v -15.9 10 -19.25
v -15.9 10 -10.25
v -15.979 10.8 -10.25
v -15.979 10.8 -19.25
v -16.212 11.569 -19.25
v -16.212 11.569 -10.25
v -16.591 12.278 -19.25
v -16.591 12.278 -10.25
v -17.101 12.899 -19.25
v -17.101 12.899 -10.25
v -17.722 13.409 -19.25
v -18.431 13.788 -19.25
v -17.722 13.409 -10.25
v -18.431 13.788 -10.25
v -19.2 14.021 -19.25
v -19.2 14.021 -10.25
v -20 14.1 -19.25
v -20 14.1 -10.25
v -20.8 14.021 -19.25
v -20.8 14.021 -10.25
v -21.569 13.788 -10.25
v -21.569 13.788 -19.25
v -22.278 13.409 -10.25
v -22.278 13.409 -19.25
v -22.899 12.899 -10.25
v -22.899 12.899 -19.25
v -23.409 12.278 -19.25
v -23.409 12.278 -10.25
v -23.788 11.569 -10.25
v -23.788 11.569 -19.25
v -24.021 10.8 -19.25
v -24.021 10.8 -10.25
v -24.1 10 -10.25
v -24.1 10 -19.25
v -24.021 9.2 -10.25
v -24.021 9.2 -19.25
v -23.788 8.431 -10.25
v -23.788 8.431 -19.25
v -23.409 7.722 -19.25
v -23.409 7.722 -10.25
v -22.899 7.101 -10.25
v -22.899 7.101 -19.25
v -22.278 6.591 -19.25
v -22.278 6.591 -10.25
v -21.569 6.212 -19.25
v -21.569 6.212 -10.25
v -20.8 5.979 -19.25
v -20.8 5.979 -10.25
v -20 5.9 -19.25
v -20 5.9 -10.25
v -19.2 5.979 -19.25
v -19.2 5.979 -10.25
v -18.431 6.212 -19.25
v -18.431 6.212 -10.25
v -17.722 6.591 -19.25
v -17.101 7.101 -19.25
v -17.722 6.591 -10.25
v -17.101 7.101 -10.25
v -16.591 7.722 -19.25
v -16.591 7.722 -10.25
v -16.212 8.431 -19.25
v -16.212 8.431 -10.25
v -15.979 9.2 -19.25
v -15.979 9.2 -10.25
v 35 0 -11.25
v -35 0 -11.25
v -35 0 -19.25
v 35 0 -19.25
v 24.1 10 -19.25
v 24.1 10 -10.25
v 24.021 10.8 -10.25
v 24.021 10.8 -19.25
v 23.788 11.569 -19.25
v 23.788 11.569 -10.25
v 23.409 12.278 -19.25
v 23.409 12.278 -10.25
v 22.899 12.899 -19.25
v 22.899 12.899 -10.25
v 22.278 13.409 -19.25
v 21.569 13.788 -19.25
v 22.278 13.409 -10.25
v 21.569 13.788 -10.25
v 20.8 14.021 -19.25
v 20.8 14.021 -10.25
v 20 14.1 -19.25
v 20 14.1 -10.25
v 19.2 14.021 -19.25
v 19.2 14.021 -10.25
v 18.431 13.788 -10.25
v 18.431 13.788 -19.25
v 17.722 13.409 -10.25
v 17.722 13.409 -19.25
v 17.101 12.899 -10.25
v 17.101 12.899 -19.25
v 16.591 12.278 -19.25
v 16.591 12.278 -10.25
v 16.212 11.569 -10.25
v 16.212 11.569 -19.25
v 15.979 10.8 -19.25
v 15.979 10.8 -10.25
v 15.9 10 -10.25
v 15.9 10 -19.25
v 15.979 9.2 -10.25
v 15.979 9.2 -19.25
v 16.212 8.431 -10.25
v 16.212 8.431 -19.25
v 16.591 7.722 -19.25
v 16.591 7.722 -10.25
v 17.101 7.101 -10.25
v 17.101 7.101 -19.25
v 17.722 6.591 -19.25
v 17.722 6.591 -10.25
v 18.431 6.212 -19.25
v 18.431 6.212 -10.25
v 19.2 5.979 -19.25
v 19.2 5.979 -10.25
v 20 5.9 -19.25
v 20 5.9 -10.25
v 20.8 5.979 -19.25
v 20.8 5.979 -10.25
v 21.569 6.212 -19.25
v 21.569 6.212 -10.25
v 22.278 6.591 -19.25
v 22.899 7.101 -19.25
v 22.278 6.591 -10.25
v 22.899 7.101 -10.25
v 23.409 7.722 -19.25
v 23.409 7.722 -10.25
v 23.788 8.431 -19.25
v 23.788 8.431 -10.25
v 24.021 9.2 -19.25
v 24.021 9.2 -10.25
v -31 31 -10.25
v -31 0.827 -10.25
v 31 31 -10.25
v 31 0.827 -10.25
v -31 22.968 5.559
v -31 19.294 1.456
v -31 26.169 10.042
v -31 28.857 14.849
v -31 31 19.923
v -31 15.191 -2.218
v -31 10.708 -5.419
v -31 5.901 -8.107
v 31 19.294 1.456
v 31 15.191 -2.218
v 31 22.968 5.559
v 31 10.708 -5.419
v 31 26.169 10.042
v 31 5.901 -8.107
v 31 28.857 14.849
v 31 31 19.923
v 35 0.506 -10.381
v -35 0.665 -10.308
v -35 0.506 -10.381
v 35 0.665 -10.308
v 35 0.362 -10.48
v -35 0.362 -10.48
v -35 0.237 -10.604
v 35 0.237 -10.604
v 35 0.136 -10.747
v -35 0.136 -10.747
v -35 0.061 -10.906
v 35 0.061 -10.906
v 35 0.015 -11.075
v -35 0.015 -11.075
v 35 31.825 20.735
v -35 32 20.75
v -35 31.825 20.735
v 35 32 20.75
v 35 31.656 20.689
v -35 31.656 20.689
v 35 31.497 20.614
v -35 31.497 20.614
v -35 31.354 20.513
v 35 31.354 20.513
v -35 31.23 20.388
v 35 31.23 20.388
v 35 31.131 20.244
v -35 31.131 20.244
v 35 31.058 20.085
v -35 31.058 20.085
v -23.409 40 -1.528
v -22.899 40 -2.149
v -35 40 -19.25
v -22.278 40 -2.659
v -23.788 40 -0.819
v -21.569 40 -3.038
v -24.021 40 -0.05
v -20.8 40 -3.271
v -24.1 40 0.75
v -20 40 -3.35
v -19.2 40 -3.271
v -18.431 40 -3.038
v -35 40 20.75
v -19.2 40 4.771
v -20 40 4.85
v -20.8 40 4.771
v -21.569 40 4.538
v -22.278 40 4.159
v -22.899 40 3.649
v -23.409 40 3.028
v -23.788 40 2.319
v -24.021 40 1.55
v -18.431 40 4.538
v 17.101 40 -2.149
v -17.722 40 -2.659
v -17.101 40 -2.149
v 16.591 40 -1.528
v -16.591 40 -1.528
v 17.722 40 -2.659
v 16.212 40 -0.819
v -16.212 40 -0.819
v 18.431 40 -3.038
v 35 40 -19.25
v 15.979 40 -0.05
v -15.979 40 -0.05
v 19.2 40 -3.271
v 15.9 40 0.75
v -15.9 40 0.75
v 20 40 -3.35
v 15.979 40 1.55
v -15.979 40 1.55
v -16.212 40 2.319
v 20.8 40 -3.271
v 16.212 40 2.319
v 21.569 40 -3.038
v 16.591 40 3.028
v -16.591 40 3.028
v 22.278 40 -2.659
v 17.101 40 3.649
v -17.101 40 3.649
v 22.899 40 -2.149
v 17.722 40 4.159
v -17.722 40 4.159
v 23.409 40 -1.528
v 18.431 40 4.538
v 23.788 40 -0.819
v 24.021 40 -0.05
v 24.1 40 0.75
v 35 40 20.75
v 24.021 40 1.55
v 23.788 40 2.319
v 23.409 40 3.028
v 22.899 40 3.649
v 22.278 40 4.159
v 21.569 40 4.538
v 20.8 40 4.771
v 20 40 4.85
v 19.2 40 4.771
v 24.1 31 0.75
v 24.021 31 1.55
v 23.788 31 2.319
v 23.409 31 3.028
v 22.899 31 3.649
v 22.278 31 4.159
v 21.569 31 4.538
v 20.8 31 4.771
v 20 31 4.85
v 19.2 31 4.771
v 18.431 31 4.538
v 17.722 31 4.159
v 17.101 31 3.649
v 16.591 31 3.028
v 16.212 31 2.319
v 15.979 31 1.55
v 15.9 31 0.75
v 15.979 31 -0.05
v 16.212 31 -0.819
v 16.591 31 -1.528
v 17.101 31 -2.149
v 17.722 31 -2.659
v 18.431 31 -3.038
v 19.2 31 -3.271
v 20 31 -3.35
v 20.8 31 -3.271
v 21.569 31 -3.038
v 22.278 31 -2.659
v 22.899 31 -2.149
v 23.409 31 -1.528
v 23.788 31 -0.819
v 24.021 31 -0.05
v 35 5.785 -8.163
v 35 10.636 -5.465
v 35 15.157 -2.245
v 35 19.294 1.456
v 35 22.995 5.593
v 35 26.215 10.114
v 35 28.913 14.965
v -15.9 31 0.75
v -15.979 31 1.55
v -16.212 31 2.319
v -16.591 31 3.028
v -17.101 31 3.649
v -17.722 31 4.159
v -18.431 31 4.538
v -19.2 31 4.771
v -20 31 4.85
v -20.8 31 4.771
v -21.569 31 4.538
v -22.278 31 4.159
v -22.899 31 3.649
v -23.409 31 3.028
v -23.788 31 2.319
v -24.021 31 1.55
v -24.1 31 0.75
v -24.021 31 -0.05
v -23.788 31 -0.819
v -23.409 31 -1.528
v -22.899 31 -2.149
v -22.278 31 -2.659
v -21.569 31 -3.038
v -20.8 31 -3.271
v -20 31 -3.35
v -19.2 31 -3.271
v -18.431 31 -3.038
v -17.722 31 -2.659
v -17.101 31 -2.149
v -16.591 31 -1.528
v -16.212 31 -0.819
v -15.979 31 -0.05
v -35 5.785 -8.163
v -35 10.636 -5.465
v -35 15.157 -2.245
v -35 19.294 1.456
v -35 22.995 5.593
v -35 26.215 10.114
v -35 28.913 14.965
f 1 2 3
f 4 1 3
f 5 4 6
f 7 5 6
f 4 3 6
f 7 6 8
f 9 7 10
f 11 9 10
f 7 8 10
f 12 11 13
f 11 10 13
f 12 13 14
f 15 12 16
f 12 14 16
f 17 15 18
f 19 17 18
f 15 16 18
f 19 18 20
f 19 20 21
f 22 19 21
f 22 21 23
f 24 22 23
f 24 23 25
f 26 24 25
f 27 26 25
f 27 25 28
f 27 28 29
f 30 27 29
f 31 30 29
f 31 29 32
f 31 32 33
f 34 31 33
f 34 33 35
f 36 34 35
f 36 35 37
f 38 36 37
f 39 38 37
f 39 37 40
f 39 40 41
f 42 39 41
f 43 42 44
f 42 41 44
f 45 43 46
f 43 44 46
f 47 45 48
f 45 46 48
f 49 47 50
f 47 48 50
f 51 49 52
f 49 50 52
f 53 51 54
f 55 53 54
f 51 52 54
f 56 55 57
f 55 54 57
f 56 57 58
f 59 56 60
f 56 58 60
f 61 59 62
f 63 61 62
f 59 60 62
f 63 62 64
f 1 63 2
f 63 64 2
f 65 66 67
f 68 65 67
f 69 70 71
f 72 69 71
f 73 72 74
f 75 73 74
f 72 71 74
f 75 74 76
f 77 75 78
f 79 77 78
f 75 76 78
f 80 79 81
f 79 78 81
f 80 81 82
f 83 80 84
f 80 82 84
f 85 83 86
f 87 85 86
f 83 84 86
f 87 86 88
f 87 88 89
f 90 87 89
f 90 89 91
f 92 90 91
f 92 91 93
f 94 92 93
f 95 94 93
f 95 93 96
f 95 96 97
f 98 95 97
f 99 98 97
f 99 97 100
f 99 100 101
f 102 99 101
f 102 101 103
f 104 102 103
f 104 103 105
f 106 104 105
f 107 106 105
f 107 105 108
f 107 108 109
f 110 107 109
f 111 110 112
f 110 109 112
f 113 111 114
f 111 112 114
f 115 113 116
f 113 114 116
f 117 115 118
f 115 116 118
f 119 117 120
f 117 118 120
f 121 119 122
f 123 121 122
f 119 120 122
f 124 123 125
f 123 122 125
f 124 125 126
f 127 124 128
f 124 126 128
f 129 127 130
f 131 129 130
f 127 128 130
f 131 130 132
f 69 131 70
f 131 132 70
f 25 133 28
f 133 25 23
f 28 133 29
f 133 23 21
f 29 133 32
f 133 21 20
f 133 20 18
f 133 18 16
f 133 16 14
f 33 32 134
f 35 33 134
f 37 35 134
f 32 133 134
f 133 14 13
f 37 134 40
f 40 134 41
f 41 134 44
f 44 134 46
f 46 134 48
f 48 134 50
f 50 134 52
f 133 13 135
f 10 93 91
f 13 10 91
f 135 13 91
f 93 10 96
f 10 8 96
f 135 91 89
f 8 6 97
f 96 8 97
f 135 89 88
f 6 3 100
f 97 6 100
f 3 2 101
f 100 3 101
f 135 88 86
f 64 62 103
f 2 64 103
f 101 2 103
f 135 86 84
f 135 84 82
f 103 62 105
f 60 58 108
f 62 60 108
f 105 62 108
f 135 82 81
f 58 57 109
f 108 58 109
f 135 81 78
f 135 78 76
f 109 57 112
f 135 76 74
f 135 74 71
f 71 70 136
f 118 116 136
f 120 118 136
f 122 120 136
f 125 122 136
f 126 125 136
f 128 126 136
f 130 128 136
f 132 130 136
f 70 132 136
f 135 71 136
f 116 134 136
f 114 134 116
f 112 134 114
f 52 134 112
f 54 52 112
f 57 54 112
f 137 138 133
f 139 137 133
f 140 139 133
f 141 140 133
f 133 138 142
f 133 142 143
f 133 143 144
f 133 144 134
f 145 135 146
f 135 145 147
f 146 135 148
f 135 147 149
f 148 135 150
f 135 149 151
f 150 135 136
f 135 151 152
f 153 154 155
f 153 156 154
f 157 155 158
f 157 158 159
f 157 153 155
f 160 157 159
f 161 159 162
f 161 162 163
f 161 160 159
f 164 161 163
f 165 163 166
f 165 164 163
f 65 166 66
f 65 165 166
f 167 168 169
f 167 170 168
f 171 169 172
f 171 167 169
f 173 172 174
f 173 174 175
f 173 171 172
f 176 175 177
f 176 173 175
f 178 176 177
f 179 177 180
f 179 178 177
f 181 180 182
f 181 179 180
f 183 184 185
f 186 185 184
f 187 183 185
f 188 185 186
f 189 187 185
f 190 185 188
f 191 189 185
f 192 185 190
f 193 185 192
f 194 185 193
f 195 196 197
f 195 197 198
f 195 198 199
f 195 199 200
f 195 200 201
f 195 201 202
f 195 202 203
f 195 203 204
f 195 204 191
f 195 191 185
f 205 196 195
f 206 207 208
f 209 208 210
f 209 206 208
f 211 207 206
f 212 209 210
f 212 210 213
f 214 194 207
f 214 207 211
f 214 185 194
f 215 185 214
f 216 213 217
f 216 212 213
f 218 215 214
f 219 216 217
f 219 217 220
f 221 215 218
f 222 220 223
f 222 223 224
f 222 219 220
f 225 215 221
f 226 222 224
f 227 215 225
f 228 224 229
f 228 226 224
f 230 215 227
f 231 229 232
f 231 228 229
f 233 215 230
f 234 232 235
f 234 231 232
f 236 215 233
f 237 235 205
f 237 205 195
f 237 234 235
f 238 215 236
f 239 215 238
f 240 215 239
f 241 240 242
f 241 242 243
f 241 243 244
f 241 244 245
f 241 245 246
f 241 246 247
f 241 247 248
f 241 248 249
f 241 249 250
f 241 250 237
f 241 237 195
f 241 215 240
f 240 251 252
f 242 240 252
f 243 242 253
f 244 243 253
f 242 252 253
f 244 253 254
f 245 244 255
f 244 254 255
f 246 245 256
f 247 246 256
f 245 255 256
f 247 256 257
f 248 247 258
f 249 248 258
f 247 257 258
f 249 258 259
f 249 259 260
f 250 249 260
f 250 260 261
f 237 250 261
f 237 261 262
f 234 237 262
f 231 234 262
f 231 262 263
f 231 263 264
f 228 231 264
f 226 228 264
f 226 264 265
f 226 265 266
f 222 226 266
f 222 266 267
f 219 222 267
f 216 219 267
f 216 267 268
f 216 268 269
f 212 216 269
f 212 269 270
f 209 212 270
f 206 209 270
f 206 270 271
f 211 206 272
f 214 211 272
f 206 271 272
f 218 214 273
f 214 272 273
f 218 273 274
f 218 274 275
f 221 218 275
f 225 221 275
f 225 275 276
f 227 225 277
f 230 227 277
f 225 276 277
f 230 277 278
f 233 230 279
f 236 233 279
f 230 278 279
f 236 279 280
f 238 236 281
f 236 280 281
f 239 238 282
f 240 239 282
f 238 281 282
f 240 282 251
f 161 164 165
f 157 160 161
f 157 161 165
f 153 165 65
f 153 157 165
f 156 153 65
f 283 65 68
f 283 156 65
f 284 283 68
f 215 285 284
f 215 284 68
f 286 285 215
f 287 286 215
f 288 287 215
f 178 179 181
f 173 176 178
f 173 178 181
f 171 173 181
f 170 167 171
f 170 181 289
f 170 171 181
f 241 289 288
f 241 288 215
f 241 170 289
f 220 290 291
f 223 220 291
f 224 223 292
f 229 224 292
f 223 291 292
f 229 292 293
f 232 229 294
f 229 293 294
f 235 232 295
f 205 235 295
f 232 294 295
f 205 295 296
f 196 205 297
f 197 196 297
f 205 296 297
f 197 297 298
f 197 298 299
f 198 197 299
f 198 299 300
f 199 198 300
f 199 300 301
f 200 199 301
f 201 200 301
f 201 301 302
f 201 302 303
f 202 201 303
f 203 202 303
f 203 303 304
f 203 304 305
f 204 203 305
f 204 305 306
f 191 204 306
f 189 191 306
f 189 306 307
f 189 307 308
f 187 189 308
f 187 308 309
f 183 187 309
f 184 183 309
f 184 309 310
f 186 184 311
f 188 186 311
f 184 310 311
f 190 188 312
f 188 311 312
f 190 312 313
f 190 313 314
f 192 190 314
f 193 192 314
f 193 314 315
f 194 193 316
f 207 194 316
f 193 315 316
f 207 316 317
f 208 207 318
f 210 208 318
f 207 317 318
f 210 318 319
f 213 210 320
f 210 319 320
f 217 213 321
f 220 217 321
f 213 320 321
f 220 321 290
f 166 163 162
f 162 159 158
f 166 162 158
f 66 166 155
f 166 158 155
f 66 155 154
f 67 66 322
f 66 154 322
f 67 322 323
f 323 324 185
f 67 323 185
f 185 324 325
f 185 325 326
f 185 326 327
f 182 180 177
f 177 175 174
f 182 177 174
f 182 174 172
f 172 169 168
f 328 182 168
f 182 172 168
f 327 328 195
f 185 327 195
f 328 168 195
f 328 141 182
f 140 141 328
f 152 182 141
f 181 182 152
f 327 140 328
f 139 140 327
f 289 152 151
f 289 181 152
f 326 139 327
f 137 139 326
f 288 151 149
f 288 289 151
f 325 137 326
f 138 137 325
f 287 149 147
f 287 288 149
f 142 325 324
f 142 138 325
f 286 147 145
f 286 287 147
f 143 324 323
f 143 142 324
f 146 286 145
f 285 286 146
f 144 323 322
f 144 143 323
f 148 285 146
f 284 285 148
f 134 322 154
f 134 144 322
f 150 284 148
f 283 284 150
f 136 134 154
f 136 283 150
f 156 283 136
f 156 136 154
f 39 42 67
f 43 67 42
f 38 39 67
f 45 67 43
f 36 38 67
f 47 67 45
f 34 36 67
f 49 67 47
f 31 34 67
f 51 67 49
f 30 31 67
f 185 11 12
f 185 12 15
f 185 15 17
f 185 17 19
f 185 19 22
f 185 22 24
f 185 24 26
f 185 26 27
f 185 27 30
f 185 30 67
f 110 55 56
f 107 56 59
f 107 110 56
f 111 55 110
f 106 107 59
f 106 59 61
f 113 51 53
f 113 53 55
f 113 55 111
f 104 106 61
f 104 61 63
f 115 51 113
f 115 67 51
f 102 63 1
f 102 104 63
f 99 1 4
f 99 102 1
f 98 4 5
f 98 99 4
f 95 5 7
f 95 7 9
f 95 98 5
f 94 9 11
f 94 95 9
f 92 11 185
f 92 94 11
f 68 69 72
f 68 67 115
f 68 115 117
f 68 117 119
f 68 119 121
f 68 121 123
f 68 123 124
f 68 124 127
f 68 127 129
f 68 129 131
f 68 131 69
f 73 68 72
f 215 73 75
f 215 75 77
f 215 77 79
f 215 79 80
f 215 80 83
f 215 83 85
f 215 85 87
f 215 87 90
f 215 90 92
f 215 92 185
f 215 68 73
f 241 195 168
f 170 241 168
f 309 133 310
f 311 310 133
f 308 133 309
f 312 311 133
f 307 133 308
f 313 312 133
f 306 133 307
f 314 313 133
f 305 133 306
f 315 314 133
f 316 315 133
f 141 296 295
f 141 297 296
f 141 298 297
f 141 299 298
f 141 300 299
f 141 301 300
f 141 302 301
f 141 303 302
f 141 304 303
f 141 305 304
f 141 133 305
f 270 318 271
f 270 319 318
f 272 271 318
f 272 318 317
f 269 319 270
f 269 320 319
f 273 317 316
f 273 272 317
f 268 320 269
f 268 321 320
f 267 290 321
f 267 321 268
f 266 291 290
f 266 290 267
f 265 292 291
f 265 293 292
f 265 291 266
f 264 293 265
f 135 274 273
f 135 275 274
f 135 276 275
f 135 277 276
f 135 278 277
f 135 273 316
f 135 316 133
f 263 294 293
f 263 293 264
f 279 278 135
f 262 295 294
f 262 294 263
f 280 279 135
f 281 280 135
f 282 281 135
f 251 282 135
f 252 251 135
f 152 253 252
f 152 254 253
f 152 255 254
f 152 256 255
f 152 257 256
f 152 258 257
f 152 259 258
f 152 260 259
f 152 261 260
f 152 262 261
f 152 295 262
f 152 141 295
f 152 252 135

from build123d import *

# Parameters (mm, degrees)
F1_DEPTH = 35
F2_R     = 4.1
F3_DEPTH = 31
F4_DEPTH = 40.001
F5_R     = 4.1
F6_DEPTH = 19.2509998957


# Not quite as in the source:
# - ends of sketch curves that miss each other by under 0.0002 mm in the source are joined


with BuildPart() as f1:
    # F0 (on Right) → F1 (new body, symmetric)
    with BuildSketch(Plane.YZ):
        with BuildLine():
            ThreePointArc((0.6654529791, -10.3075948367), (0.1831243905, -10.6731600274), (3e-10, -11.2499998957))
            Line((3e-10, -11.2499998957), (0, -19.2499998957))
            Line((0, -19.2499998957), (40, -19.2499998957))
            Line((40, -19.2499998957), (40, 20.7500001043))
            Line((40, 20.7500001043), (32, 20.7500001043))
            ThreePointArc((32, 20.7500001043), (31.4231601317, 20.5668757138), (31.057594941, 20.0845471252))
            ThreePointArc((31.057594941, 20.0845471252), (19.2938390593, 1.456161045), (0.6654529791, -10.3075948367))
        make_face()
    extrude(amount=F1_DEPTH, both=True)

    # F2 (on Front) → F3 (cut)
    with BuildSketch(Plane.XZ):
        Polygon((-15.9000523031, -10.2499328405), (15.8999476969, -10.2499328405), (19.9999476969, -10.2499328405), (24.0999476969, -10.2499328405), (30.9999476969, -10.2499328405), (30.9999476969, 19.9232501595), (-31.0000523031, 19.9232501595), (-31.0000523031, -10.2499328405), (-24.1000523031, -10.2499328405), (-20.0000523031, -10.2499328405), align=None)
        with Locations((-20.0000523031, 0.7500671595)):
            Circle(F2_R, mode=Mode.SUBTRACT)
        with Locations((19.9999476969, 0.7500671595)):
            Circle(F2_R, mode=Mode.SUBTRACT)
        with Locations((-20.0000523031, 0.7500671595)):
            Circle(F2_R)
        with Locations((19.9999476969, 0.7500671595)):
            Circle(F2_R)
    extrude(amount=-F3_DEPTH, mode=Mode.SUBTRACT)

    # F2 (on Front) → F4 (cut, through all)
    with BuildSketch(Plane.XZ):
        with Locations((19.9999476969, 0.7500671595)):
            Circle(F2_R)
        with Locations((-20.0000523031, 0.7500671595)):
            Circle(F2_R)
    extrude(amount=-F4_DEPTH, mode=Mode.SUBTRACT)

    # F5 (on Top) → F6 (cut, through all)
    with BuildSketch(Plane.XY):
        with Locations((-20.000027626, 10)):
            Circle(F5_R)
        with Locations((19.999972374, 10)):
            Circle(F5_R)
    extrude(amount=-F6_DEPTH, mode=Mode.SUBTRACT)


solid = f1.part
